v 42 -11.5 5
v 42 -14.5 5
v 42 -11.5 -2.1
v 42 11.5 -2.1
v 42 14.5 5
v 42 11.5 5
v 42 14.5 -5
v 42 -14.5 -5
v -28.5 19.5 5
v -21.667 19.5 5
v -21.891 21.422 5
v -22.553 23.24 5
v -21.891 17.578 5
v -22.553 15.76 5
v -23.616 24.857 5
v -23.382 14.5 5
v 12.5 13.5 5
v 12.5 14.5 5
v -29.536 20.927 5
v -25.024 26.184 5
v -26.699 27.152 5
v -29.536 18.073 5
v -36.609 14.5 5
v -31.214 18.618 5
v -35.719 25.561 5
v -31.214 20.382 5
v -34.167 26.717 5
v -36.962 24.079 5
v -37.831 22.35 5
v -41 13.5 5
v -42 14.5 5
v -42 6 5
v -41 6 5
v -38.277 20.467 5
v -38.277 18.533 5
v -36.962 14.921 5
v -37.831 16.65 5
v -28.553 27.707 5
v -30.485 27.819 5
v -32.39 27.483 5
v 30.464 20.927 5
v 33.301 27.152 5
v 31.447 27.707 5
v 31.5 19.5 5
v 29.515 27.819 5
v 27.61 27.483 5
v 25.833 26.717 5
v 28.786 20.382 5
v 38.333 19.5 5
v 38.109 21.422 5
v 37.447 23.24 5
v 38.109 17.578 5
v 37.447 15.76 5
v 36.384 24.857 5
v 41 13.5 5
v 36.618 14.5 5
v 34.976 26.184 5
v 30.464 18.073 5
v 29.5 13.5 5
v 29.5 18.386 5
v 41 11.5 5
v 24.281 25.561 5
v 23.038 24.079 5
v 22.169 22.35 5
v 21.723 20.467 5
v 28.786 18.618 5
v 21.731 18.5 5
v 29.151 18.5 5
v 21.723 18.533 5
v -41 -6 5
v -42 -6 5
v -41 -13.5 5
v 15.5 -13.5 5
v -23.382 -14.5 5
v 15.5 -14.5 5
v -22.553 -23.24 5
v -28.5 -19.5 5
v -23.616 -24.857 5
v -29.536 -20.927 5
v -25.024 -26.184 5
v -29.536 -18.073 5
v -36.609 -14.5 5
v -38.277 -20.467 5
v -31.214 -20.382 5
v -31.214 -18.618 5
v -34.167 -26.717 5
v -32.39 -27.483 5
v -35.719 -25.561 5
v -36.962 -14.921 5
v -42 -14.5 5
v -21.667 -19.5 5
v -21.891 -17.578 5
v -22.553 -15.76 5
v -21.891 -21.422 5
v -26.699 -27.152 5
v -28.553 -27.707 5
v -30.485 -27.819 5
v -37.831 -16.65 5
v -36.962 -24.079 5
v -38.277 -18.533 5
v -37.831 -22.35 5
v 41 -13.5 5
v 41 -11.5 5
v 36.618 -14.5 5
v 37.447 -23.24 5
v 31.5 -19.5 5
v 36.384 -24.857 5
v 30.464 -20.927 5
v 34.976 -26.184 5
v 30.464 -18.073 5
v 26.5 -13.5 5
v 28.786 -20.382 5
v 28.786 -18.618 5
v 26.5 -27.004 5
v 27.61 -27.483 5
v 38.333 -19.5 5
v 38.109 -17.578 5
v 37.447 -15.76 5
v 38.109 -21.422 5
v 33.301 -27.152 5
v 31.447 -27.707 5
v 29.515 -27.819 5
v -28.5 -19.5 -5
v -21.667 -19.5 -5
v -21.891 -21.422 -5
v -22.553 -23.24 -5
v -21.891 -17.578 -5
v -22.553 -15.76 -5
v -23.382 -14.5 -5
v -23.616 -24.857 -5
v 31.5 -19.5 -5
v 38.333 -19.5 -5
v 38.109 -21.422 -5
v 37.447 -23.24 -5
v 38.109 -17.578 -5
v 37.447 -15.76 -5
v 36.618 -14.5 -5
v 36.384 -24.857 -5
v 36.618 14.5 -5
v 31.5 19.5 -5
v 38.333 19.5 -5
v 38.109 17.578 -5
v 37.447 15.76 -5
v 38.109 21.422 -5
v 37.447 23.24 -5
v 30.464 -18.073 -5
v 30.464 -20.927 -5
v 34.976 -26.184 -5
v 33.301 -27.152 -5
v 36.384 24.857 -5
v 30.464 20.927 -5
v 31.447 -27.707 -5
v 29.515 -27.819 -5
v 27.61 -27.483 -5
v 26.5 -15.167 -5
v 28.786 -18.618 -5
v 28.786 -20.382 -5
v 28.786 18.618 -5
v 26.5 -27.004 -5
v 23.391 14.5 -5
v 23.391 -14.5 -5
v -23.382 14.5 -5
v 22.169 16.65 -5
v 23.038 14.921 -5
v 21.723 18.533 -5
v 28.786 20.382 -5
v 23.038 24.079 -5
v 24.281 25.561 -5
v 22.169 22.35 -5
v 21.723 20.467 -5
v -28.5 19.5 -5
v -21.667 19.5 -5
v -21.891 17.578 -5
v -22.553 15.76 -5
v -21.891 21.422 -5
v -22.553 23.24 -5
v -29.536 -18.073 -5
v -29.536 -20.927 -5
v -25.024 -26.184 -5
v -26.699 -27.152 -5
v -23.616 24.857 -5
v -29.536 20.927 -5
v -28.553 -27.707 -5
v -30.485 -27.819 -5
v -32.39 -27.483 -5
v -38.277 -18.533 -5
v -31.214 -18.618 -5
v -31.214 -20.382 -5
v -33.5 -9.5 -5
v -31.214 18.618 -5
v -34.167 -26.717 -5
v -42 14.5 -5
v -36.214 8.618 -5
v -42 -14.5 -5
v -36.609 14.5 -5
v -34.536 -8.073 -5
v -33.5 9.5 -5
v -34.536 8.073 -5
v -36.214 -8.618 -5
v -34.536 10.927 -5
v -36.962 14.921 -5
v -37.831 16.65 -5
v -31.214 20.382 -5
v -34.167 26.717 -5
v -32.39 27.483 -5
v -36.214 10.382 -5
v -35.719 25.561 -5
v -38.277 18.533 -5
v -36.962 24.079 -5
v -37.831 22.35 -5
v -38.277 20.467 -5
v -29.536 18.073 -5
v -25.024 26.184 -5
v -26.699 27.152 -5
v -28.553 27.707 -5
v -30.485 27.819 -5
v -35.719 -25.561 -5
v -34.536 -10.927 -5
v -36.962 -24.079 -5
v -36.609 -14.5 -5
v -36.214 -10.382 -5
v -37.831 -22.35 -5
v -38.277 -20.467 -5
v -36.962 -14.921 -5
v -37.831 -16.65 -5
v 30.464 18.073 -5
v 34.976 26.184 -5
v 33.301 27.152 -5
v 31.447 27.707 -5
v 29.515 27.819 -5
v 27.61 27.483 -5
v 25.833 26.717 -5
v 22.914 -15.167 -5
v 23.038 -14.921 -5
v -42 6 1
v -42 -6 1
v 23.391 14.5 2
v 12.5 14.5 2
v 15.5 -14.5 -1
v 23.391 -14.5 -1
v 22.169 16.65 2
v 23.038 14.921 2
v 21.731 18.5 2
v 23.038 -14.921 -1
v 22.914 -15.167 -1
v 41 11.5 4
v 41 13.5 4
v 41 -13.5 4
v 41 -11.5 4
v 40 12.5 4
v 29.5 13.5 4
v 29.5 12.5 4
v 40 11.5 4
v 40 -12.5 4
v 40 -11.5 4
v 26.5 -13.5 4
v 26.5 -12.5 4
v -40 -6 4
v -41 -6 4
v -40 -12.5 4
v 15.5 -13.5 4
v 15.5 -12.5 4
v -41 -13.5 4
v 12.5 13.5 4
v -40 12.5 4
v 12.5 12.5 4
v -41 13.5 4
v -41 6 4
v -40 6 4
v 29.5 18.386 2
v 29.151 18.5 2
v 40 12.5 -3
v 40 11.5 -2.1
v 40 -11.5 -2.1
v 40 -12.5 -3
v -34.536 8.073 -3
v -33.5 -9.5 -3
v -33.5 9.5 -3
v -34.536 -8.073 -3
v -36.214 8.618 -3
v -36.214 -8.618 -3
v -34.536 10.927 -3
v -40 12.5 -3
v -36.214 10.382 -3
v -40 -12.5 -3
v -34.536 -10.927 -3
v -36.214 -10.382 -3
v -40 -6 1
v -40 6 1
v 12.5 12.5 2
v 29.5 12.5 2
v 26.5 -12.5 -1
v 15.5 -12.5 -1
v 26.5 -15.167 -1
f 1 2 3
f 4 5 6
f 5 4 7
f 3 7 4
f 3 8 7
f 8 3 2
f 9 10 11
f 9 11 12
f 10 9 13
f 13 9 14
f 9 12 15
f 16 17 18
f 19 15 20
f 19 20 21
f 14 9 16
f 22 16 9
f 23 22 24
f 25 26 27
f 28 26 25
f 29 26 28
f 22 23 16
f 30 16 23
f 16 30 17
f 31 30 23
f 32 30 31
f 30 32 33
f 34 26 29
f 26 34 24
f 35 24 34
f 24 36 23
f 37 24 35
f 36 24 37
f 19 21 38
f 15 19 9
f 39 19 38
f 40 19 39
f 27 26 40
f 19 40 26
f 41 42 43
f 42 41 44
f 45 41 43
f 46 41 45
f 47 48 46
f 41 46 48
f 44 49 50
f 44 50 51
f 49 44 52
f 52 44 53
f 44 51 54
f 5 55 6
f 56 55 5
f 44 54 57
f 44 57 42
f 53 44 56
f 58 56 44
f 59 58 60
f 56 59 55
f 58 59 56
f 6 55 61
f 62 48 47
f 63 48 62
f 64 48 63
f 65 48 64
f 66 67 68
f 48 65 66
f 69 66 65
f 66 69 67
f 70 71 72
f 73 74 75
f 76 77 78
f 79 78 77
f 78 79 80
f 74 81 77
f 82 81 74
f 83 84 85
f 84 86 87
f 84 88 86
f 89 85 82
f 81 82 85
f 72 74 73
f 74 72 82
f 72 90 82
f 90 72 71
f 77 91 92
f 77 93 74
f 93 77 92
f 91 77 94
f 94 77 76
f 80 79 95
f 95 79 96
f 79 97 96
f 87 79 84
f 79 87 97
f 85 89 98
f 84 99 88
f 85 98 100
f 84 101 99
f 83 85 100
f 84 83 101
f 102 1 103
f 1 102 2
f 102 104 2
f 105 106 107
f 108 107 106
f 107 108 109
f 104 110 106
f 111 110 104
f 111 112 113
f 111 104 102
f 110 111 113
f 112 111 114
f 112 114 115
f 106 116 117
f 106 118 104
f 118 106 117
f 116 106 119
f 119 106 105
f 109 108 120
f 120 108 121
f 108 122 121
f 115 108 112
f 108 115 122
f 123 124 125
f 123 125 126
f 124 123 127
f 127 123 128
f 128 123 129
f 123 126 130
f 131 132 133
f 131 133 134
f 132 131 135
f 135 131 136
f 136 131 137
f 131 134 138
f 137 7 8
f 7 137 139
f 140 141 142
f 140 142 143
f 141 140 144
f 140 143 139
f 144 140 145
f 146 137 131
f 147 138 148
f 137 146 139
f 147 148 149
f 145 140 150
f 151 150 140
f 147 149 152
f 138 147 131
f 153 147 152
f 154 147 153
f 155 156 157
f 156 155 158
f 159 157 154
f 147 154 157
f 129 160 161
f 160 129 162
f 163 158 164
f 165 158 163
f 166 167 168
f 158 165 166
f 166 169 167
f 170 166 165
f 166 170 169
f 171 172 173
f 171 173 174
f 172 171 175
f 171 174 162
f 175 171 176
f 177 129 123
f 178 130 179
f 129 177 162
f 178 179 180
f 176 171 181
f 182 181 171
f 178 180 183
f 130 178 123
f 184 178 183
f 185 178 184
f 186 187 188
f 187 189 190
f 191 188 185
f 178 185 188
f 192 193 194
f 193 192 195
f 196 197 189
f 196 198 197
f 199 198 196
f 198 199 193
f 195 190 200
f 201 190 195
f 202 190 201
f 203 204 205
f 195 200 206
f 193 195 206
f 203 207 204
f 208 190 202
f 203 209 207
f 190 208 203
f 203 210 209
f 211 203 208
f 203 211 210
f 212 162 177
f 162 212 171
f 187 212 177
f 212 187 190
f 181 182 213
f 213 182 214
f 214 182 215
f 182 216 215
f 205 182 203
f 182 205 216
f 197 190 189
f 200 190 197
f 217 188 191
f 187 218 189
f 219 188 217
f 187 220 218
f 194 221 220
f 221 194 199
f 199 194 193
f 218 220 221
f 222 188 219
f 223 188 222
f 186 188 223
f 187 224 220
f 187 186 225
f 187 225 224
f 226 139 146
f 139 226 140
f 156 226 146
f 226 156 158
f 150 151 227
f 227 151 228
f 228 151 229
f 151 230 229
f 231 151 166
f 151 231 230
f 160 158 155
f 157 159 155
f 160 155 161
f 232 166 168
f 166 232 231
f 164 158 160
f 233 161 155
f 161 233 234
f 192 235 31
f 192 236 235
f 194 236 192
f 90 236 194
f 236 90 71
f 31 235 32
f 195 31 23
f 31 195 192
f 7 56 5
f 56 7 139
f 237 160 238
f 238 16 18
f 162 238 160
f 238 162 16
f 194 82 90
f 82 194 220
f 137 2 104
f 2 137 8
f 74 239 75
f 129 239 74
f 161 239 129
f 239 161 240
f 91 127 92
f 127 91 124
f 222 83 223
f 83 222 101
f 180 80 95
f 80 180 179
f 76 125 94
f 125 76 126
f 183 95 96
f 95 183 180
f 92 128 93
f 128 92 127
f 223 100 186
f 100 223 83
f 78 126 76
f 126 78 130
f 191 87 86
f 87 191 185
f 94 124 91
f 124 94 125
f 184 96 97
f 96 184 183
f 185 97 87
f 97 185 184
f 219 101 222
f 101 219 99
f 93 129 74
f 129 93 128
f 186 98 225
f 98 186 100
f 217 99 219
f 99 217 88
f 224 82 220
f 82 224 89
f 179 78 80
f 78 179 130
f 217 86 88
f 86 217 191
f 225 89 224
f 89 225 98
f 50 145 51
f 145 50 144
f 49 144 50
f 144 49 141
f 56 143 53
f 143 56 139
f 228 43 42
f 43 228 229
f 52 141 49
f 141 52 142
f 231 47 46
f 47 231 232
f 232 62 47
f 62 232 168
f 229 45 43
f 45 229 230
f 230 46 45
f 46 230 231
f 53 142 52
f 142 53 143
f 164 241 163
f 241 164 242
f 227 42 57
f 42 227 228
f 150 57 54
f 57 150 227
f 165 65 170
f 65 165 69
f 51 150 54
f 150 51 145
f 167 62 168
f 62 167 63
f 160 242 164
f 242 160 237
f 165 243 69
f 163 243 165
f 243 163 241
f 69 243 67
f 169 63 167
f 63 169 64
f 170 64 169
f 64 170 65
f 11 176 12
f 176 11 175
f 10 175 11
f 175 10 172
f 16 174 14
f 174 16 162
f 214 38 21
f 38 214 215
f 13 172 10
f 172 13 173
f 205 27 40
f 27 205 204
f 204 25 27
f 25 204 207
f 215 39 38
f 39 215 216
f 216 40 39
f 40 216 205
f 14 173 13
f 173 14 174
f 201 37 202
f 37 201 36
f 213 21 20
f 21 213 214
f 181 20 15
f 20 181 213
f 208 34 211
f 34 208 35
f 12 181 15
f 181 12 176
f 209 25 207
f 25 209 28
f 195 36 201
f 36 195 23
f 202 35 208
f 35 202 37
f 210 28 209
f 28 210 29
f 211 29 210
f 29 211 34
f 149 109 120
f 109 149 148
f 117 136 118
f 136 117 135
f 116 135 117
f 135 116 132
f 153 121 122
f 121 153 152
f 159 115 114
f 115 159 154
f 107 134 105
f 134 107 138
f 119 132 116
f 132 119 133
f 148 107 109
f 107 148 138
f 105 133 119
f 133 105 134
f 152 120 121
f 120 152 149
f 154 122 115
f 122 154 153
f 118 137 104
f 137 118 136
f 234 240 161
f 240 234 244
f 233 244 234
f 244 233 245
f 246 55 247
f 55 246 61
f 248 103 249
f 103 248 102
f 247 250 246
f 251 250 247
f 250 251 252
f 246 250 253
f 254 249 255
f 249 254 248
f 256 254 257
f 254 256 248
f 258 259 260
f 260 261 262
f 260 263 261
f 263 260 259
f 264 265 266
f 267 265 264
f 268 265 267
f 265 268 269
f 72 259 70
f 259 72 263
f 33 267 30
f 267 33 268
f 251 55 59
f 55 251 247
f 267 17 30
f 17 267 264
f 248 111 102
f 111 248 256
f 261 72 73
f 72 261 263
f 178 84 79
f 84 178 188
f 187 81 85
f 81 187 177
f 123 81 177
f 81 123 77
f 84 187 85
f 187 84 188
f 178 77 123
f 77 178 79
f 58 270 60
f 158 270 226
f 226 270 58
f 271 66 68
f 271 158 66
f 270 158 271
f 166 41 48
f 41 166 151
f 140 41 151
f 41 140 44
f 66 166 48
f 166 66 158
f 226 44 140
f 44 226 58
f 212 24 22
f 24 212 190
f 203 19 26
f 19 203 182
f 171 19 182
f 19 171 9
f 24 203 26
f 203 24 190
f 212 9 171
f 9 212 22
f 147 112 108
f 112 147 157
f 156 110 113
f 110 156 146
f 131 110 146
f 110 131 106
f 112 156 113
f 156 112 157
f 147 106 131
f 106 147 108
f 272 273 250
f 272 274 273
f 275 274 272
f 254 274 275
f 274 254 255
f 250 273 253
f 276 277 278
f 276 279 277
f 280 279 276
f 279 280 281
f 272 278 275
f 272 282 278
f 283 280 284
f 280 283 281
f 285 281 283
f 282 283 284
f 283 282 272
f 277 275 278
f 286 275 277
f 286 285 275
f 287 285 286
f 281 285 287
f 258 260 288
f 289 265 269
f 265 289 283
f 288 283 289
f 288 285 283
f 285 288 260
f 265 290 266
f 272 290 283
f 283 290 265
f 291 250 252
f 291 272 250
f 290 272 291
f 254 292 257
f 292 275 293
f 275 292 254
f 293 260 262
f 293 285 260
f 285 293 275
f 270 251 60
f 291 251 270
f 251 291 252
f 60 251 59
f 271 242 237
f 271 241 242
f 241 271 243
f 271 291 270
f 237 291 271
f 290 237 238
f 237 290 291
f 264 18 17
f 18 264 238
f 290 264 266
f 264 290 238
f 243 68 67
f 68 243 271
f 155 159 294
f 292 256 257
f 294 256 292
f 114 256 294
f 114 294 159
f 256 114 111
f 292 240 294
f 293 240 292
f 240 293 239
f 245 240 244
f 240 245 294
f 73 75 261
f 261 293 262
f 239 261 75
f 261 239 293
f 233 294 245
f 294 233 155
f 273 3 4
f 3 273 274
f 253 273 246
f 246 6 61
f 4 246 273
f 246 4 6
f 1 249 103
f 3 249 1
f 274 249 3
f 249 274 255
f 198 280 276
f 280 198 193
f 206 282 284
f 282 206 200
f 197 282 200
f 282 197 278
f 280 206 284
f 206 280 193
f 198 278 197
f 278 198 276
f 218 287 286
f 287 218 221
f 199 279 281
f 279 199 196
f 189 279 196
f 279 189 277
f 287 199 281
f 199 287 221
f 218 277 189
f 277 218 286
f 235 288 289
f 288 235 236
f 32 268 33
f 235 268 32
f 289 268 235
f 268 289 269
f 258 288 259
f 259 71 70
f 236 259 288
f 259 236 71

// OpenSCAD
width=80; //(+2 = 82)
height=25; //(+2 = 27)

depth=7;
tdepth=10;

thickness=2;
border=1;




radius = height/3;
drill_rad=1.5;
drill_x=60;
drill_y=39;

sma_dia=7;

sd_out=6;

module bottom() {
difference() {
union() {
cube([width+thickness*2,height+thickness*2,depth],center=true);
translate([-(drill_x/2),-drill_y/2,0]) cylinder(depth,radius,radius,center=true);
translate([(drill_x/2), drill_y/2,0]) cylinder(depth,radius,radius,center=true);
translate([-(drill_x/2),drill_y/2,0]) cylinder(depth,radius,radius,center=true);
translate([(drill_x/2), -drill_y/2,0]) cylinder(depth,radius,radius,center=true);

}
translate([0,0,thickness]) cube([width,height,depth],center=true);
translate([0,0,depth-border]) cube([width+border*2,height+border*2,depth],center=true);
translate([-(drill_x/2),-drill_y/2,0]) cylinder(depth,drill_rad,drill_rad,center=true);
translate([(drill_x/2), drill_y/2,0]) cylinder(depth,drill_rad,drill_rad,center=true);
translate([-(drill_x/2),drill_y/2,0]) cylinder(depth,drill_rad,drill_rad,center=true);
translate([(drill_x/2), -drill_y/2,0]) cylinder(depth,drill_rad,drill_rad,center=true);
/* a cut for the uart console */
translate([0,height/2,0]) cube([11,11,2.7],center=true);
}
}


module top() {
	difference() {
	 union() {
	 cube([width+thickness*2,height+thickness*2,tdepth],center=true);
       translate([-(drill_x/2),-drill_y/2,0]) cylinder(tdepth,radius,radius,center=true);	
       translate([(drill_x/2), drill_y/2,0]) cylinder(tdepth,radius,radius,center=true);
       translate([-(drill_x/2),drill_y/2,0]) cylinder(tdepth,radius,radius,center=true);
       translate([(drill_x/2), -drill_y/2,0]) cylinder(tdepth,radius,radius,center=true);

   }
	translate([0,0,tdepth-border]) cube([width+border*2,height+border*2,tdepth],center=true);
      
	translate([-(drill_x/2),-drill_y/2,0]) cylinder(tdepth,drill_rad,drill_rad,center=true);
      translate([(drill_x/2), drill_y/2,0]) cylinder(tdepth,drill_rad,drill_rad,center=true);
      translate([-(drill_x/2),drill_y/2,0]) cylinder(tdepth,drill_rad,drill_rad,center=true);
      translate([(drill_x/2), -drill_y/2,0]) cylinder(tdepth,drill_rad,drill_rad,center=true);
	
	translate([0,0,thickness]) cube([width,height,tdepth],center=true);

/* sma */
//      translate([0, -height/2, -1]) rotate([90,0,0]) cylinder(tdepth,sma_dia/2,sma_dia/2,center=true);

/* sd */
 	translate([width/2-19, height/2, tdepth/2])  cube([17,sd_out*2,3*2],center=true);

/* miniusb*/
	translate([width/2-19, -height/2, tdepth/2])  cube([11,height*1.5,6*2],center=true);
 	translate([width/2-19, -drill_y/2-4, tdepth/2])  cube([11,radius*2,height*2],center=true);
	

/* usb & power */
translate([width/2,0,tdepth/2+border]) cube([11,height-2,8.1*2],center=true);
      
/* btn & led */
	translate([-width/2+5,height/2-3,0]) cylinder(tdepth*2,drill_rad,drill_rad,center=true);
	translate([-width/2+5,-height/2+3,0]) cylinder(tdepth*2,drill_rad,drill_rad,center=true);



/* HDMI */ 
translate([-width/2,0,tdepth/2+border]) cube([11,12,5*2],center=true);
      }

}


//bottom();
//translate([0,0,30])
 top();
